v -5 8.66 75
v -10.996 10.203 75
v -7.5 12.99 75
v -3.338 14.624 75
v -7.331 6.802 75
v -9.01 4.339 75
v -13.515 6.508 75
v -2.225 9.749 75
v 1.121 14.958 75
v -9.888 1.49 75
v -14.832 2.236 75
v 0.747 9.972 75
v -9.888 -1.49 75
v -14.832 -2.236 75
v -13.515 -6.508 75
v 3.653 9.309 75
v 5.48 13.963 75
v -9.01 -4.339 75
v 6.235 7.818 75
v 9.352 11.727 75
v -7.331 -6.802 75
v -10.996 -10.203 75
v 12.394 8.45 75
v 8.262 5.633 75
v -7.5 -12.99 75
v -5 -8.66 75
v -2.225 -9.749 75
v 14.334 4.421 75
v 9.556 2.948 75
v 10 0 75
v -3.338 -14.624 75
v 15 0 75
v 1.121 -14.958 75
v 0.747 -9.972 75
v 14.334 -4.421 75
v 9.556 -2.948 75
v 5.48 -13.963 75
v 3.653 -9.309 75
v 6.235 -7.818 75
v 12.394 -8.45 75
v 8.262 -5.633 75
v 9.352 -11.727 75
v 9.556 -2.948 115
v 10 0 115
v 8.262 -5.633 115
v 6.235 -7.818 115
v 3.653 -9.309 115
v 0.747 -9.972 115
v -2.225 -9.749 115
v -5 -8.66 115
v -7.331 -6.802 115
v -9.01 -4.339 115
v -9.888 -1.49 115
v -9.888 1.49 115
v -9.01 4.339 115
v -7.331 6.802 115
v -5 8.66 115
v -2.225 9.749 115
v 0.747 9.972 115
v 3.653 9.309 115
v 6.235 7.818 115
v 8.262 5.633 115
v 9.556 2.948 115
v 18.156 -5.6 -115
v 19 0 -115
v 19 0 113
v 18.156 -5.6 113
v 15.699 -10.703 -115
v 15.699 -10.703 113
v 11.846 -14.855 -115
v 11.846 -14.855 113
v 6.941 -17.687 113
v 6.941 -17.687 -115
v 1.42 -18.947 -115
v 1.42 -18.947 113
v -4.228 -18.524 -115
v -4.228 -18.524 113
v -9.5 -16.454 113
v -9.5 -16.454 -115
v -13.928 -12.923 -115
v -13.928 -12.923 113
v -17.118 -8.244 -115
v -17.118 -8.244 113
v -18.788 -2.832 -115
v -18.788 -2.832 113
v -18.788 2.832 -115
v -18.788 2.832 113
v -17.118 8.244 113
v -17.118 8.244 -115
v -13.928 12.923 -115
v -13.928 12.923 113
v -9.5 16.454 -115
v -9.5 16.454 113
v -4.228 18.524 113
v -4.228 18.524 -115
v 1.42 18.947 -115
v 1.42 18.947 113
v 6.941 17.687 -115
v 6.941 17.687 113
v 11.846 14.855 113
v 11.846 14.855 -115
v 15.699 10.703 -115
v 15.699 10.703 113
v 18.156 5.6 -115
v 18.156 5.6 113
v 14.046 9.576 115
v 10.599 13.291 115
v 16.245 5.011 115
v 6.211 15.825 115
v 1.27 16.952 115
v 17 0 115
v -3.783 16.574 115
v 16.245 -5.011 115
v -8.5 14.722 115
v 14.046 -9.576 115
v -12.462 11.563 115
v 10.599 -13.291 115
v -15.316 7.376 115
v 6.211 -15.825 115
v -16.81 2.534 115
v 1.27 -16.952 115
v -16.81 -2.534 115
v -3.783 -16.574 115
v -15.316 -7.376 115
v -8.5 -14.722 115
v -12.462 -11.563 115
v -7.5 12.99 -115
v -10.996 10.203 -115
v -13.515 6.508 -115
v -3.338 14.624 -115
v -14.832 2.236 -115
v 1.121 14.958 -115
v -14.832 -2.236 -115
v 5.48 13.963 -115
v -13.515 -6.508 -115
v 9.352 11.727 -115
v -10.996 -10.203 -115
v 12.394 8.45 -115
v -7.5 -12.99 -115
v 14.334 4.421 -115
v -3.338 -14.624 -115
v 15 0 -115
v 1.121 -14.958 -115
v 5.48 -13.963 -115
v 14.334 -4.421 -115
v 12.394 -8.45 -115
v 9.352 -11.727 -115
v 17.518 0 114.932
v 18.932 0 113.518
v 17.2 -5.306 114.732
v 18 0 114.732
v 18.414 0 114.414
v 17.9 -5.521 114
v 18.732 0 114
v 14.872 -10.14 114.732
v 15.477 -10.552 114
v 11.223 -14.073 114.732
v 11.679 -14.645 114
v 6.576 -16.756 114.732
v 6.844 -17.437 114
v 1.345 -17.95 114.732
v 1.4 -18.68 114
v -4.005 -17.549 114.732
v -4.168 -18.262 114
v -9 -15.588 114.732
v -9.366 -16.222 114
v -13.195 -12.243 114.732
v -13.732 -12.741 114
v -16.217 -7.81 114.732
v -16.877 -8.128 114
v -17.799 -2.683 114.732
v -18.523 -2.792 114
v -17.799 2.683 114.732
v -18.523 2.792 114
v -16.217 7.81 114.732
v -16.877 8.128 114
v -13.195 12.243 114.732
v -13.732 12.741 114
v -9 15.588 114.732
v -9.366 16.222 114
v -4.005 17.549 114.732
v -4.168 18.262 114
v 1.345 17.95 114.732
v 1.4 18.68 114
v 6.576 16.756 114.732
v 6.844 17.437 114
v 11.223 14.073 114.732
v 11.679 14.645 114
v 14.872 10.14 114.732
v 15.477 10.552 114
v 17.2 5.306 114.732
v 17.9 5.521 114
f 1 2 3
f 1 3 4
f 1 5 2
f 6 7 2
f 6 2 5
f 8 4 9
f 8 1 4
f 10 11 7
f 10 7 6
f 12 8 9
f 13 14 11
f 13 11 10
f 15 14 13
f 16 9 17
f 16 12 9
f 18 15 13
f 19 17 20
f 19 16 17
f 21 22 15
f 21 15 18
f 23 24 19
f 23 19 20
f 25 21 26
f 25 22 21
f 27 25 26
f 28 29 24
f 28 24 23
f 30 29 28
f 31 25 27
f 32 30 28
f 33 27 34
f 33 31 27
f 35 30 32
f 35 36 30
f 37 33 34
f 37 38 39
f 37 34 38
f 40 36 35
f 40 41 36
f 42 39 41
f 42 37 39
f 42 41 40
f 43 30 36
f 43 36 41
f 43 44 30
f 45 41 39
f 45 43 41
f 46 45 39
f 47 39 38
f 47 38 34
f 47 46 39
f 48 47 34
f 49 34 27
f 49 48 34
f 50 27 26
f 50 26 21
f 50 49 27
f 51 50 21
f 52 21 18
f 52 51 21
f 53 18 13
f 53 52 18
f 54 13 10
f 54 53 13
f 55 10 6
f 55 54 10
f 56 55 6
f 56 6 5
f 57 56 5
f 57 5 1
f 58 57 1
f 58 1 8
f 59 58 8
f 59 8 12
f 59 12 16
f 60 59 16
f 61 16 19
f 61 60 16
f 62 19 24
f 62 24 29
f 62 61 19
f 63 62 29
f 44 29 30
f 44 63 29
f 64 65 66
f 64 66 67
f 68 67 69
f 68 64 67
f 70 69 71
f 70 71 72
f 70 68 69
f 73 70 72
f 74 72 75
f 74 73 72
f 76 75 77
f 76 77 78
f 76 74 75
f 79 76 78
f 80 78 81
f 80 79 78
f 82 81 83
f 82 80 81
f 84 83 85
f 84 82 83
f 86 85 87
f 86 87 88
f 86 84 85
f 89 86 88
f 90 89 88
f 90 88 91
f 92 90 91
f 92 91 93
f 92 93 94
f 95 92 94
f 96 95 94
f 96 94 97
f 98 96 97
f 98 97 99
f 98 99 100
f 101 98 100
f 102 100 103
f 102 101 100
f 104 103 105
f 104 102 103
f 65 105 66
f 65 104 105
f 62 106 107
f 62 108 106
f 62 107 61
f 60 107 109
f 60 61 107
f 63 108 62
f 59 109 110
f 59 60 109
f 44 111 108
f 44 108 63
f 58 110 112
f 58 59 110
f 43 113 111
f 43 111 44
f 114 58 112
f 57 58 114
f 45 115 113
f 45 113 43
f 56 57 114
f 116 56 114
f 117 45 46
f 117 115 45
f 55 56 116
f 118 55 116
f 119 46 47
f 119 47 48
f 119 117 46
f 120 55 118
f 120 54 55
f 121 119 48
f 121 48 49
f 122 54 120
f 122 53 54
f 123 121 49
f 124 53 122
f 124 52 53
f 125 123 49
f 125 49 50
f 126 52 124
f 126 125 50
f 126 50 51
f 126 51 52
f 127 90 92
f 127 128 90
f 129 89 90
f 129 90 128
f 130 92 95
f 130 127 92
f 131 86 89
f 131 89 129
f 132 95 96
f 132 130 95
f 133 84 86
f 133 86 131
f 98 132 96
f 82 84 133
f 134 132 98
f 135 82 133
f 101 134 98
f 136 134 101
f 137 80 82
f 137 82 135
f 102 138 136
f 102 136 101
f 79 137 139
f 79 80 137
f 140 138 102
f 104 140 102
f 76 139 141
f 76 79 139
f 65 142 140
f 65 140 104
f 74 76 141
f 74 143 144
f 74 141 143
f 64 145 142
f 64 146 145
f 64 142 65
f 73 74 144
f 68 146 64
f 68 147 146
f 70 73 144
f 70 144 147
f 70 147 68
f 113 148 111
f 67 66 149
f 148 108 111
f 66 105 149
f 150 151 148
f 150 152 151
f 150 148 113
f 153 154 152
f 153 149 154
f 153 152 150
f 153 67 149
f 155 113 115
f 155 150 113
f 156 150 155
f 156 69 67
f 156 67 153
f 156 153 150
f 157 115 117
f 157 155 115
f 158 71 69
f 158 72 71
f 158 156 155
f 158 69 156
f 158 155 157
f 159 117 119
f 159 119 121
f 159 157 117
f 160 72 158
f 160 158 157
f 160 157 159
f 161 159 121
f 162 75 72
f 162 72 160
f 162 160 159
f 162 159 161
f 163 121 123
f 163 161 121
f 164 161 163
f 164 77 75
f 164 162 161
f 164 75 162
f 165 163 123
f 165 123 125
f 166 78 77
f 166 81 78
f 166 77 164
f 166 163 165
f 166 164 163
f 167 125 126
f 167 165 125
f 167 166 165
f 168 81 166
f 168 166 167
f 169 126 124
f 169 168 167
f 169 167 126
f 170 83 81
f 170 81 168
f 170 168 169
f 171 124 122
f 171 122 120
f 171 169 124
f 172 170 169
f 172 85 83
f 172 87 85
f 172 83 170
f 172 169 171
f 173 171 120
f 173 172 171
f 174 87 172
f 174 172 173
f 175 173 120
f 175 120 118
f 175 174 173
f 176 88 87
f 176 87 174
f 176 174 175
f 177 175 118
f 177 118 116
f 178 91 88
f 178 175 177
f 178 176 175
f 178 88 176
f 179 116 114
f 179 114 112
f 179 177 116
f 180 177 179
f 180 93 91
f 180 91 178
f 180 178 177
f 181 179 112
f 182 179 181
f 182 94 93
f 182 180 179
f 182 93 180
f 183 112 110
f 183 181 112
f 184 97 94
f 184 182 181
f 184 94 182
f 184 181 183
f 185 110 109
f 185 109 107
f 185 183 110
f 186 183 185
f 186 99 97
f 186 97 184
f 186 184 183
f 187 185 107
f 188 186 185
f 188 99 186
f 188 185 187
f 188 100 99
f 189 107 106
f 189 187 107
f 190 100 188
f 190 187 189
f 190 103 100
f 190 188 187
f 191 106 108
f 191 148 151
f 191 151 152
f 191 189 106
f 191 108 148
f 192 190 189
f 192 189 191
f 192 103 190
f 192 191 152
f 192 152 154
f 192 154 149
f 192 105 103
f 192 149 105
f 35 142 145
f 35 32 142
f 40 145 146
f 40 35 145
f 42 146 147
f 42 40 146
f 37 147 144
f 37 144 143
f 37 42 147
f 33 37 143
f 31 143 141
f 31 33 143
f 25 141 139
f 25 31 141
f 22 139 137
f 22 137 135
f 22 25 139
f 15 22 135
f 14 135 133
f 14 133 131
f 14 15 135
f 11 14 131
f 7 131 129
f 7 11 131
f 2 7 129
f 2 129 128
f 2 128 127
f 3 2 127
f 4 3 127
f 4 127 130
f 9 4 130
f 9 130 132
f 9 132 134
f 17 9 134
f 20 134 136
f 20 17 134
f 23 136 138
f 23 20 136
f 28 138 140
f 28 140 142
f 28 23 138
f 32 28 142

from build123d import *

# Parameters (mm, degrees)
FILLET1_R = 2


with BuildPart() as part:
    # Sketch1 → Revolve1 (revolve)
    with BuildSketch(Plane.YZ, mode=Mode.PRIVATE) as revolve1_sk:
        Polygon((10, 115), (19, 115), (19, -115), (15, -115), (15, 75), (10, 75), align=None)
    revolve(revolve1_sk.sketch.rotate(Axis((0, 0, 319.317365216), (0, 0, -1)), 90), axis=Axis((0, 0, 319.317365216), (0, 0, -1)))

    # Fillet1
    fillet1_edges = [part.edges().sort_by_distance(p)[0] for p in [
        (-19, 0, 115),
    ]]
    fillet(fillet1_edges, radius=FILLET1_R)


solid = part.part
